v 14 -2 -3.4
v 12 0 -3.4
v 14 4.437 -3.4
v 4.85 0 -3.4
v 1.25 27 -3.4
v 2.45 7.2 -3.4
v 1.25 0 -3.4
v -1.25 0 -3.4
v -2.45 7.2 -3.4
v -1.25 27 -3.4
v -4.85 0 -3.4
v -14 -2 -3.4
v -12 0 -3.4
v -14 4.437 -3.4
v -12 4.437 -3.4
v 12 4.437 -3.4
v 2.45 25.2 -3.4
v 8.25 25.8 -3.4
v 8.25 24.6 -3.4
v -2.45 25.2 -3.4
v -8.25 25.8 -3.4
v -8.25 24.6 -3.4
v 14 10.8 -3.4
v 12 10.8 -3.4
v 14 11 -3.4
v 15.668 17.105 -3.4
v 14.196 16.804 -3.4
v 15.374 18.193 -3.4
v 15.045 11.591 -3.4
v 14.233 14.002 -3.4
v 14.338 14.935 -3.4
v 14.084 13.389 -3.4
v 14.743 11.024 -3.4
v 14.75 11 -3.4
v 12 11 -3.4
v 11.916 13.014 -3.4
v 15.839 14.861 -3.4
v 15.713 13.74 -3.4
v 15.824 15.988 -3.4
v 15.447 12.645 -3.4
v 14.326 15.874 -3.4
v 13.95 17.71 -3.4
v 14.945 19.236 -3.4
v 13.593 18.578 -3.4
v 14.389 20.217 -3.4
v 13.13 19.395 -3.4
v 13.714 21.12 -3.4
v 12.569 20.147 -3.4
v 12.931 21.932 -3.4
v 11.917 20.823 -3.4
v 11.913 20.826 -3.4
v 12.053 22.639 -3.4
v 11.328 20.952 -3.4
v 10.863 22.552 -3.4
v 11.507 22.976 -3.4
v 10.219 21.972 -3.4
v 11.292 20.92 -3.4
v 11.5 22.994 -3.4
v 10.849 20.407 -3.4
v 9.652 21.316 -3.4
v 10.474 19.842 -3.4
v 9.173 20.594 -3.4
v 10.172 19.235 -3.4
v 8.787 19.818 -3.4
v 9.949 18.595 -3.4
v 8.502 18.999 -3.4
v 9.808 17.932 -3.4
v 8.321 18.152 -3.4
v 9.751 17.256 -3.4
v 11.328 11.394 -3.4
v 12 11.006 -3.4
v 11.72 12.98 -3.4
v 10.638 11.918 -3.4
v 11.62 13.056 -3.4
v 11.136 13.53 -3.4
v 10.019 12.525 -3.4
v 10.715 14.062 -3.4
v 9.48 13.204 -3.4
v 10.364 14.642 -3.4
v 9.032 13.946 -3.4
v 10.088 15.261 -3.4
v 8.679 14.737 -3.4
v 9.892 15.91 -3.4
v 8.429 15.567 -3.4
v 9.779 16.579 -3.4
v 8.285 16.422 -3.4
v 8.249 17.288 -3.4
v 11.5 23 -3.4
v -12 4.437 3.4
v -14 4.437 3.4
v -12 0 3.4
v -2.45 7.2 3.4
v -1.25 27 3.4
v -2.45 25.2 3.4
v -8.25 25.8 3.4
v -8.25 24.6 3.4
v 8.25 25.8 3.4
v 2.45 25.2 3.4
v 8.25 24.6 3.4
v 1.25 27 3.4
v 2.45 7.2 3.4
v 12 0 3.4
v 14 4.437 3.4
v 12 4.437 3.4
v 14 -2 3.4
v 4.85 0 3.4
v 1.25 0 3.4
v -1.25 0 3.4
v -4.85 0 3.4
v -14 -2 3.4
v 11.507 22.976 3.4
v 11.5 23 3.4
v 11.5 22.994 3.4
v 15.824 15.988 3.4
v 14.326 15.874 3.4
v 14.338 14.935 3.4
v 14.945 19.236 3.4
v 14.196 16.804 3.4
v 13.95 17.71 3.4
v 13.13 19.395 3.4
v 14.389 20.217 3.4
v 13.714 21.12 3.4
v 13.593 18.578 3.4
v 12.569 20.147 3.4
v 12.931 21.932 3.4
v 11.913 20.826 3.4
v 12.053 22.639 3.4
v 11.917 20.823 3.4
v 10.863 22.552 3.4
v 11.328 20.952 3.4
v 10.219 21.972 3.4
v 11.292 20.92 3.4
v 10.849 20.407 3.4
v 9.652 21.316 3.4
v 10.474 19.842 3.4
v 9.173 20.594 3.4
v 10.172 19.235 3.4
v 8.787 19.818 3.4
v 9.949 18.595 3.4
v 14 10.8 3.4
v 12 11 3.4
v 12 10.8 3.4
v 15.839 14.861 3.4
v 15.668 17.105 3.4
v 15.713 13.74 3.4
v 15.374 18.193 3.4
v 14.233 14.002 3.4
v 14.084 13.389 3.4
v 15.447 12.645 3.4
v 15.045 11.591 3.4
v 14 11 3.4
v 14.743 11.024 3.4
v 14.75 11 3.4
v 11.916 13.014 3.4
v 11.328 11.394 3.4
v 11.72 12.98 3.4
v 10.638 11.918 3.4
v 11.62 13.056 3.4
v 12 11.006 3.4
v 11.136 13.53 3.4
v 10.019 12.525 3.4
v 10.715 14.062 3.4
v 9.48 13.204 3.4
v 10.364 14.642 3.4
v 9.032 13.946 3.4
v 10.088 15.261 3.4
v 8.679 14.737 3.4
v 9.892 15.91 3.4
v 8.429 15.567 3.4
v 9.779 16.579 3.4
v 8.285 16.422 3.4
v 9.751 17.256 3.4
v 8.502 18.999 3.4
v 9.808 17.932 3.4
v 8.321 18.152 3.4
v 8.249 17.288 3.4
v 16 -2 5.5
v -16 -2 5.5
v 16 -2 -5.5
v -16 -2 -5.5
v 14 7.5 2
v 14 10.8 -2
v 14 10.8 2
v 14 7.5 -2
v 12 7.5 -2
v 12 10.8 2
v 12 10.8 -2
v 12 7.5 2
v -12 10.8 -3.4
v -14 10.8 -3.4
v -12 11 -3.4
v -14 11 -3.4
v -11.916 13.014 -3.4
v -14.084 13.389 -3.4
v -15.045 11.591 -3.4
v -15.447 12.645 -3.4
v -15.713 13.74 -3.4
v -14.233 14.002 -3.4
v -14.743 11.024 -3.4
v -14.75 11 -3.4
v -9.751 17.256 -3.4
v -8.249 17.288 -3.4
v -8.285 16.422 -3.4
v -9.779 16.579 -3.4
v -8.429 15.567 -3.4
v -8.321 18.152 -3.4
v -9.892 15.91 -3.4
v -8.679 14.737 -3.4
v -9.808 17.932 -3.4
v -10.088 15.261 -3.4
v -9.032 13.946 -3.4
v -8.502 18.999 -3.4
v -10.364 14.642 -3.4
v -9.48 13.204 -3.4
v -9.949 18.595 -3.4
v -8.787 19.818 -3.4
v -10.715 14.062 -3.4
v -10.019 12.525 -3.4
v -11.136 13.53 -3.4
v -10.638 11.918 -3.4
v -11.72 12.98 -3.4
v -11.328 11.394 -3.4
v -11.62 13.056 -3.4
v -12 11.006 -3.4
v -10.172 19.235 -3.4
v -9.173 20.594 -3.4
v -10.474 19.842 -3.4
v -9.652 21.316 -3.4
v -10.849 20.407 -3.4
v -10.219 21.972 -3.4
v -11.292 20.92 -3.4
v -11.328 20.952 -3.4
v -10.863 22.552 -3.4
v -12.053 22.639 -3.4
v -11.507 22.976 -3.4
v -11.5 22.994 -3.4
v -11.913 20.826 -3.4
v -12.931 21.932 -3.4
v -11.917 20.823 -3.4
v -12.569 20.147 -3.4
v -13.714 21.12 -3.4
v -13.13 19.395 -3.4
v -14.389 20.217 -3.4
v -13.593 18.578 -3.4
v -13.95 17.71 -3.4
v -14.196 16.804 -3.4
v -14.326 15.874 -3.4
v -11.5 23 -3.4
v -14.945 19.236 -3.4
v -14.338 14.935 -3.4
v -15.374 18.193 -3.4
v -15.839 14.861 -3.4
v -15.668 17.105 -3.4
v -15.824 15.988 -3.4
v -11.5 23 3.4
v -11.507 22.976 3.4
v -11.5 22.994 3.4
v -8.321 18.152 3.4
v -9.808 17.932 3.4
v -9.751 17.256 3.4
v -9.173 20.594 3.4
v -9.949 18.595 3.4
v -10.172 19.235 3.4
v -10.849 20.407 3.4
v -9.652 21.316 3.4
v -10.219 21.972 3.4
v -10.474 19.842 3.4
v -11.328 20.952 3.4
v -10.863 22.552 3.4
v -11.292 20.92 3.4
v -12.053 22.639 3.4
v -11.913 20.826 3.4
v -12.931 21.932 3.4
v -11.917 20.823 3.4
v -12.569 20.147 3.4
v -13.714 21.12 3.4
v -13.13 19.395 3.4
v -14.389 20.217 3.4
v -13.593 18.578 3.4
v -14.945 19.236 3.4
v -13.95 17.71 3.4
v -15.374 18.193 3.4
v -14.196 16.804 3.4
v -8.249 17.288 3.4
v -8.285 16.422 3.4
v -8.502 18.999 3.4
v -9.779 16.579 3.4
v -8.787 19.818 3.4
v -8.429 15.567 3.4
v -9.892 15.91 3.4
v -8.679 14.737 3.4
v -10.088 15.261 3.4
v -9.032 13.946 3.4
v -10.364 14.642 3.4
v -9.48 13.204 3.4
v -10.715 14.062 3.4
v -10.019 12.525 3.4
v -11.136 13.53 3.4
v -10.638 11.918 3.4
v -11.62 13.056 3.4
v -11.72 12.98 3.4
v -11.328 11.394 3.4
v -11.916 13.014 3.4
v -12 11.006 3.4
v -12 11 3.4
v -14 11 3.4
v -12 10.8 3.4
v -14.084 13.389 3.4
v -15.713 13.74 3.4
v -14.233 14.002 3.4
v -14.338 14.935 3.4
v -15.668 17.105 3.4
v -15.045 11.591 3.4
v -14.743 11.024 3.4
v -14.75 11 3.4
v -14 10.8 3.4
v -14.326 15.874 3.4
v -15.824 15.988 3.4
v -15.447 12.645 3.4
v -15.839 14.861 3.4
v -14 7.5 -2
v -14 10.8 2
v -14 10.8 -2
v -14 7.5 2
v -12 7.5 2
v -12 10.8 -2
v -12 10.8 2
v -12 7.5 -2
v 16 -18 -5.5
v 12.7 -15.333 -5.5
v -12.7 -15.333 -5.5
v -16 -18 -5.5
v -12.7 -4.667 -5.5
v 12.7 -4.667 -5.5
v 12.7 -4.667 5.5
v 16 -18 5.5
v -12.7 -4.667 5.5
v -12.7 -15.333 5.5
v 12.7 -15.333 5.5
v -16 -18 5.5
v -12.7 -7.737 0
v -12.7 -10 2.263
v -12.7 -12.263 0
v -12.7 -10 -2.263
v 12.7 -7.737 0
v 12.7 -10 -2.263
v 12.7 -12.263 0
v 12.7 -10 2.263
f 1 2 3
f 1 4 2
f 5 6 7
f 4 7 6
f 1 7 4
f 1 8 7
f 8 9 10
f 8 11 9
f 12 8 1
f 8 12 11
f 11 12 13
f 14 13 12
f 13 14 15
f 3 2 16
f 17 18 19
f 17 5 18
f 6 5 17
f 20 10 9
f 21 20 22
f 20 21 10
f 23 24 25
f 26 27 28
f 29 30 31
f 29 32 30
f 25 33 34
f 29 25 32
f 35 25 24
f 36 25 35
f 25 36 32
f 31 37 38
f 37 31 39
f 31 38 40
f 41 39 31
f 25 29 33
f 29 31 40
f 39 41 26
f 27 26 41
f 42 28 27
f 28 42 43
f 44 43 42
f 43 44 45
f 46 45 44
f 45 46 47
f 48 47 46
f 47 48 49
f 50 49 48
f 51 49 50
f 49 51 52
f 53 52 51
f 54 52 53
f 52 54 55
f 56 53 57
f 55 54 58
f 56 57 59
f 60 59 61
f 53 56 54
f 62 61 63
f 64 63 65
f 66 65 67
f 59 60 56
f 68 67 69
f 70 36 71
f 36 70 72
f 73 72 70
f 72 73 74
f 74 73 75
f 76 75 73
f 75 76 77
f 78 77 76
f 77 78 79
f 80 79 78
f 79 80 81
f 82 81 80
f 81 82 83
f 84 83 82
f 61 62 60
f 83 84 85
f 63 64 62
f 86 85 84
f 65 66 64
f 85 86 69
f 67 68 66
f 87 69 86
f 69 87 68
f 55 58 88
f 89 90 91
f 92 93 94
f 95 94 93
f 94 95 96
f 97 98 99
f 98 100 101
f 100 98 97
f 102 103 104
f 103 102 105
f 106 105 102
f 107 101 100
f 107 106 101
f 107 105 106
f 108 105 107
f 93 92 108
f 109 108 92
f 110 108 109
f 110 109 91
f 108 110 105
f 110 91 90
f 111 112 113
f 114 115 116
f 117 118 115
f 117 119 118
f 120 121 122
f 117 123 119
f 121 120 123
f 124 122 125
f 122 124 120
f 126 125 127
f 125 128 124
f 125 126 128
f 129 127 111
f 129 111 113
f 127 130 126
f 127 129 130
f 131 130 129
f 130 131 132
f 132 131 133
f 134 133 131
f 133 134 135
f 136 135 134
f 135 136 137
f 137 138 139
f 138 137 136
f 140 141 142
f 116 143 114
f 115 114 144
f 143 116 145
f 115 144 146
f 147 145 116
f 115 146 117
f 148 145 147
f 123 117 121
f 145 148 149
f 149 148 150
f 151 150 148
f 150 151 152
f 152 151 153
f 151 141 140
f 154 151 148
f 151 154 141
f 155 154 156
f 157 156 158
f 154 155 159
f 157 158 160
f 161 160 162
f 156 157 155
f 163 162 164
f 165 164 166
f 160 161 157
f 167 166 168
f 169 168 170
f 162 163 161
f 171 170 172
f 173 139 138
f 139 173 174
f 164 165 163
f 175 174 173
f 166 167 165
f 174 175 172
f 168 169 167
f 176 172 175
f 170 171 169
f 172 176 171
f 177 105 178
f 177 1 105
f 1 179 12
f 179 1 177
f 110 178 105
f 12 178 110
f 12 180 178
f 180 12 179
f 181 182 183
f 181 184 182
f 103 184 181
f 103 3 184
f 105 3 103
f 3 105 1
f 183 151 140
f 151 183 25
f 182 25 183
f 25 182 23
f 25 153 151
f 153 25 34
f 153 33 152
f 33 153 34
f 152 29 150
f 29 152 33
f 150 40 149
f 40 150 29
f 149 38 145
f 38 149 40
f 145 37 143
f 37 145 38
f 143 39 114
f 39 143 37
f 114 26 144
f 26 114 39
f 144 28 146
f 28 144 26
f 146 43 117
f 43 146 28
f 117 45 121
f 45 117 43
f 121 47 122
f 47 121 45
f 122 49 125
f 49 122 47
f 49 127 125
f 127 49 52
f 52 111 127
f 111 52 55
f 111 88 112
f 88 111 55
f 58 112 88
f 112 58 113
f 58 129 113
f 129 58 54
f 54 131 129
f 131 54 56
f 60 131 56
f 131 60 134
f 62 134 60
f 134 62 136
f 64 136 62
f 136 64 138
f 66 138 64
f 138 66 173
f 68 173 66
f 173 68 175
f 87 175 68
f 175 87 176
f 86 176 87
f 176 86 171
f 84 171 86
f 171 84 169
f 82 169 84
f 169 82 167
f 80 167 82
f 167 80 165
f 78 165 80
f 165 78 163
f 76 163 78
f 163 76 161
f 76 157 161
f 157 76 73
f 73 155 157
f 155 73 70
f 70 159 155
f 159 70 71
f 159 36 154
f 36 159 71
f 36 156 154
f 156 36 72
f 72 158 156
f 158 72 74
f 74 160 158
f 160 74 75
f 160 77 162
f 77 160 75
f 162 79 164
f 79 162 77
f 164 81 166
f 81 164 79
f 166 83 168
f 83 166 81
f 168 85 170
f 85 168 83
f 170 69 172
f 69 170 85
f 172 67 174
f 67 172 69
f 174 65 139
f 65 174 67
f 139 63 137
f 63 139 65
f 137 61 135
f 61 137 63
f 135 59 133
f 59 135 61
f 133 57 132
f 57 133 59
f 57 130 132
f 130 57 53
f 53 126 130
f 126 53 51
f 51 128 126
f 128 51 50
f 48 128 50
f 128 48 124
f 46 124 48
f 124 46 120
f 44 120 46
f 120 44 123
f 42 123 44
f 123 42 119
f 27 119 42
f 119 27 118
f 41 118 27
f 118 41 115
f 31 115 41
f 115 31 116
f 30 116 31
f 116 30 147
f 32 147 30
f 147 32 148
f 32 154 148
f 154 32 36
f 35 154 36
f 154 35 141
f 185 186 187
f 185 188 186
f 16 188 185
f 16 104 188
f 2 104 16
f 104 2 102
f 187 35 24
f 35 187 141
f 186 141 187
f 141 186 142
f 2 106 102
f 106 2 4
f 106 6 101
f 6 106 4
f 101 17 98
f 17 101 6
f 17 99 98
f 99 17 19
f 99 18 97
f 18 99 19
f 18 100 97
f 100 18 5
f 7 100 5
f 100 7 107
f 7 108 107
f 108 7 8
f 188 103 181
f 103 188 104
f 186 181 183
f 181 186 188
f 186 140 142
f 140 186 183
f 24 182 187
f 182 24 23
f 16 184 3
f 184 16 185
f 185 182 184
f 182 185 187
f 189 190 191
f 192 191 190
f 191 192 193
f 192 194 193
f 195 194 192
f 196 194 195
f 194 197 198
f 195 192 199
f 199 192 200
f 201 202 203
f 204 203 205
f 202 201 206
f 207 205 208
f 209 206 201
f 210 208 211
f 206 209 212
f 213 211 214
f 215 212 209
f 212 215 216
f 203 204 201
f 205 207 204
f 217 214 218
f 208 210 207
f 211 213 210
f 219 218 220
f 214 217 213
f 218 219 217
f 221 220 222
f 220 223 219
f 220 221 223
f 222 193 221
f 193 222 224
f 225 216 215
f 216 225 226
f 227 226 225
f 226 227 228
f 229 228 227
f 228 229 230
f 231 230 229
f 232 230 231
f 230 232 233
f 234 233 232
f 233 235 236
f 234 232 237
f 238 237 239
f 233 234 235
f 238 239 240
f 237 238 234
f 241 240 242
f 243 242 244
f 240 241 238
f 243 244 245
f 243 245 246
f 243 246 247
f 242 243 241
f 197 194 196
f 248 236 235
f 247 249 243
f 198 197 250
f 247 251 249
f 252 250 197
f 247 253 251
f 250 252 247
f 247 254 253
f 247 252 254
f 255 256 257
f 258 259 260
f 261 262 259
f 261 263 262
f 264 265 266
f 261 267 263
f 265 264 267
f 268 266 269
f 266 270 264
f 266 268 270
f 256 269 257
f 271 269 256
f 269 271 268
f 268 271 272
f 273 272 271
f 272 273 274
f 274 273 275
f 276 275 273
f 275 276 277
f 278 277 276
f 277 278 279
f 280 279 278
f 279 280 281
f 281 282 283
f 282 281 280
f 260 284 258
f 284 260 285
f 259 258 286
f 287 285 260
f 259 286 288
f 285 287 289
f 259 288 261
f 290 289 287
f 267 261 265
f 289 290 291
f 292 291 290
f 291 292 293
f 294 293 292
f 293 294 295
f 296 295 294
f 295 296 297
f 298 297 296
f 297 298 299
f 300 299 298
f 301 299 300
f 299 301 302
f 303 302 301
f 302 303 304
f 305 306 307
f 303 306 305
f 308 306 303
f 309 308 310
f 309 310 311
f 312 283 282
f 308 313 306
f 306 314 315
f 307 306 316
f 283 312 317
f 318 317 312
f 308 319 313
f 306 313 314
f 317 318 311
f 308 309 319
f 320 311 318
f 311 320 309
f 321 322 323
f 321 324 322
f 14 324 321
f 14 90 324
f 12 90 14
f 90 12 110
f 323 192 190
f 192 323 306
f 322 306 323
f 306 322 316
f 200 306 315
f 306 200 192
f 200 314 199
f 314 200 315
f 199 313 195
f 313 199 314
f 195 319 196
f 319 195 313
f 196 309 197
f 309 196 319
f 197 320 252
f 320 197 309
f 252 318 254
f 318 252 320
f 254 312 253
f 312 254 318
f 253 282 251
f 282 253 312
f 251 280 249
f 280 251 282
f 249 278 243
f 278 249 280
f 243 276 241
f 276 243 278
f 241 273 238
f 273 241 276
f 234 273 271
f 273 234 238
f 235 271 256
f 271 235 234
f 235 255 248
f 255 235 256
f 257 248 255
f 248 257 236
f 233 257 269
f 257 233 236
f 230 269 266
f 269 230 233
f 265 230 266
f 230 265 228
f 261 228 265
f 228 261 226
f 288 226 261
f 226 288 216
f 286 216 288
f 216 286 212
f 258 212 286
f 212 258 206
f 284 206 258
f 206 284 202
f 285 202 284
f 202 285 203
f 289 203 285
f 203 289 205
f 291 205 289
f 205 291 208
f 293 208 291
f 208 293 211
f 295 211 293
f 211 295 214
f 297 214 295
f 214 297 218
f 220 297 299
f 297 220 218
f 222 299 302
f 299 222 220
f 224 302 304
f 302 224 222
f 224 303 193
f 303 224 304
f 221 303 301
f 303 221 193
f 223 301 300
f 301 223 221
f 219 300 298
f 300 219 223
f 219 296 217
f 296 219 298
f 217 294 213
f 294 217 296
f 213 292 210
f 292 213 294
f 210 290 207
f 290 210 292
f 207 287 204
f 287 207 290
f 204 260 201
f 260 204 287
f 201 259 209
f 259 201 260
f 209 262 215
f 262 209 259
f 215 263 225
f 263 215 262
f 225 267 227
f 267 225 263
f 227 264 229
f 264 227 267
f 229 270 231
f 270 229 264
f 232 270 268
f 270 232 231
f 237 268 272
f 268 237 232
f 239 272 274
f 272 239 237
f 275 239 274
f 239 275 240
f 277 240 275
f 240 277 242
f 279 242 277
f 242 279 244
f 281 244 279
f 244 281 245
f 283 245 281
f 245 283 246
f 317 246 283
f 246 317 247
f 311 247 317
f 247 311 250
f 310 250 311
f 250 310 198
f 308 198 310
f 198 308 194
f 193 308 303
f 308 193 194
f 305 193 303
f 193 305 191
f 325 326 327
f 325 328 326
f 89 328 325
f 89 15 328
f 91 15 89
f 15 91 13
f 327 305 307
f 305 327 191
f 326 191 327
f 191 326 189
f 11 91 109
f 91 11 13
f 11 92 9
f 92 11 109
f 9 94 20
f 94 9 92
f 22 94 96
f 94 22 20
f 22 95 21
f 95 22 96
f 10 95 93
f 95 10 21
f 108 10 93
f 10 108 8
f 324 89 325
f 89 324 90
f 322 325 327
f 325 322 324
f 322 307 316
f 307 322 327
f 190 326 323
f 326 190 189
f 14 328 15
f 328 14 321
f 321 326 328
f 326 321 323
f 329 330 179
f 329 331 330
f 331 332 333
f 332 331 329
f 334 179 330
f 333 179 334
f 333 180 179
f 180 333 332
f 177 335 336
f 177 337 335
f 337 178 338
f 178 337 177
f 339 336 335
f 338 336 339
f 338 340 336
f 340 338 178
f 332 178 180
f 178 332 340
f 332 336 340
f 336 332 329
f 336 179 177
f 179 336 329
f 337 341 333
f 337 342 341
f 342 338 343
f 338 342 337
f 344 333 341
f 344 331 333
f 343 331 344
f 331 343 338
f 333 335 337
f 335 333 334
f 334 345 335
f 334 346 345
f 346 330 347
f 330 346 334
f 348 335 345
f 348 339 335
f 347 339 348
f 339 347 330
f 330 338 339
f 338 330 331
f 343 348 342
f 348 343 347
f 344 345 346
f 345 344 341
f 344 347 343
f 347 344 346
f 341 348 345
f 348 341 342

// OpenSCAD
$fn = 50;

tolerance = 0.2;

// Prong width


function dist(p1, p2) = sqrt(pow(p2[0]-p1[0],2) + pow(p2[1]-p1[1],2));

buckle_height=6.8;


// strap holder

strap_width = 25.4;
strap_holder_width = 32;
strap_holder_depth = 16;
strap_holder_height = 11;

shaft_thickness=2;

retainer_ratio = 5;

union() {
    
    buckle();

    
    translate([0, -(strap_holder_depth/2 + shaft_thickness), 0]) {
        linear_extrude(height=strap_holder_height, center=true) {
            difference() {
                square([strap_holder_width, strap_holder_depth], center=true);
                square([strap_width, strap_holder_depth / 1.5], center=true);
            }
        }
    }

    translate([0, -(strap_holder_depth/2 + shaft_thickness), 0])
    rotate([45,0,0]) {
        cube([strap_width, strap_holder_depth/retainer_ratio, strap_holder_depth/retainer_ratio], center=true);
    }
}

module buckle() {

    

    shaft_length=11;
    shaft_thickness=2;
    shaft_innerSpacing = 24;

    notch_length=3.5;
    notch_depth=4;


    buckle_half();
    mirror([1,0,0]) {
        buckle_half();
    }

    module buckle_half() {

        difference() {
            linear_extrude(height=buckle_height, center=true) {    
                buckle_profile();
            }
            
            notch();
            
            // Notch
            mirror([0,0,1]) {
                notch();
            }
            
        }            
    }
    
    module notch() {
        translate([shaft_innerSpacing/2-tolerance,0,0]) {
            rotate([90,0,90]) {
                linear_extrude(height=shaft_thickness+2*tolerance) {
                    polygon(points=[
                        [tolerance, (buckle_height/2 + tolerance)],
                        [shaft_length-notch_length*2, (buckle_height/2 + tolerance)],
                        [shaft_length-notch_length, (notch_depth/2)],
                        [shaft_length-tolerance, (notch_depth/2)],
                        [shaft_length-tolerance, (buckle_height/2 + tolerance)]
                    ]);
                }
            }
        }
    }


    module buckle_profile() {
        
        union() {
            prong();
            spacer();
        }
        
        width = 28;
        thickness=2;
        translate([0,-thickness])
        square([width/2, thickness]);

        module prong() {

            prong_spacing = 23;
            prong_length = 23;
            prong_width = 7.5;
            prong_step = 0.75;
            
            c1 = dist([shaft_innerSpacing/2, shaft_length],[prong_spacing/2, prong_length]);
            c2 = dist([prong_spacing/2, prong_length],[shaft_innerSpacing/2+shaft_thickness+prong_step, shaft_length]);    
            
            a1 = acos((prong_length-shaft_length)/c1);
            a2 = acos((prong_length-shaft_length)/c2);    
            
            difference() {
                union() {
                    polygon(points=[
                        [shaft_innerSpacing/2, 0],
                        [shaft_innerSpacing/2, shaft_length],
                        [shaft_innerSpacing/2, shaft_length],
                        [prong_spacing/2, prong_length],
                        [shaft_innerSpacing/2+shaft_thickness+prong_step, shaft_length],
                        [shaft_innerSpacing/2+shaft_thickness, shaft_length],
                        [shaft_innerSpacing/2+shaft_thickness, 0],
                    ]);
                    
                    inner_prong();
                    outer_prong();
                }
                
                offset(r=-thickness/2) {
                    hull() {
                        offset(-0.5) {
                            inner_prong();
                        }
                        
                        offset(-0.5) {
                            outer_prong();
                        }
                    }
                }
            }
            
            module inner_prong() {
            
                h1 = 3.5;
                r1 = (h1/2) + (pow(c1,2)/(8*h1));

                translate([prong_spacing/2, prong_length]) {
                    rotate(90+a1) {
                        translate([-c1/2, 0]) {
                            intersection() {
                                translate([-r1,0]) {
                                    square([2*r1, h1]);
                                }
                                translate([0, -r1+h1]) {
                                    circle(r=r1);
                                }
                            }
                        }
                    }
                }
            }
            
            module outer_prong() {
        
                h2 = 2.5;
                r2 = (h2/2) + (pow(c2,2)/(8*h2));
                
                // Outer curve
                translate([prong_spacing/2, prong_length]) {
                    rotate(90+a2) {
                        translate([-c2/2, -h2]) {
                            intersection() {
                                translate([-r2,0]) {
                                    square([2*r2, h2]);
                                }
                                translate([0, r2]) {
                                    circle(r=r2);
                                }
                            }
                        }
                    }
                }
            }
        }

        module spacer() {
        
            spacer_spacing = 2.5;
            spacer_length = 27;
            spacer_width = 7;
            spacer_thickness = 1.2;
            
            polygon(points=[
                [spacer_spacing/2, 0],
                [spacer_spacing/2, spacer_length],
                [spacer_spacing/2+spacer_width, spacer_length-spacer_thickness],
                [spacer_spacing/2+spacer_width, spacer_length-2*spacer_thickness],
            
            
                [spacer_spacing/2+spacer_thickness, spacer_length-1.5*spacer_thickness],
            
                [spacer_spacing/2+spacer_thickness, spacer_thickness*6],
            
                [spacer_spacing/2+3*spacer_thickness, 0]
            ]);
        }
    }
}
